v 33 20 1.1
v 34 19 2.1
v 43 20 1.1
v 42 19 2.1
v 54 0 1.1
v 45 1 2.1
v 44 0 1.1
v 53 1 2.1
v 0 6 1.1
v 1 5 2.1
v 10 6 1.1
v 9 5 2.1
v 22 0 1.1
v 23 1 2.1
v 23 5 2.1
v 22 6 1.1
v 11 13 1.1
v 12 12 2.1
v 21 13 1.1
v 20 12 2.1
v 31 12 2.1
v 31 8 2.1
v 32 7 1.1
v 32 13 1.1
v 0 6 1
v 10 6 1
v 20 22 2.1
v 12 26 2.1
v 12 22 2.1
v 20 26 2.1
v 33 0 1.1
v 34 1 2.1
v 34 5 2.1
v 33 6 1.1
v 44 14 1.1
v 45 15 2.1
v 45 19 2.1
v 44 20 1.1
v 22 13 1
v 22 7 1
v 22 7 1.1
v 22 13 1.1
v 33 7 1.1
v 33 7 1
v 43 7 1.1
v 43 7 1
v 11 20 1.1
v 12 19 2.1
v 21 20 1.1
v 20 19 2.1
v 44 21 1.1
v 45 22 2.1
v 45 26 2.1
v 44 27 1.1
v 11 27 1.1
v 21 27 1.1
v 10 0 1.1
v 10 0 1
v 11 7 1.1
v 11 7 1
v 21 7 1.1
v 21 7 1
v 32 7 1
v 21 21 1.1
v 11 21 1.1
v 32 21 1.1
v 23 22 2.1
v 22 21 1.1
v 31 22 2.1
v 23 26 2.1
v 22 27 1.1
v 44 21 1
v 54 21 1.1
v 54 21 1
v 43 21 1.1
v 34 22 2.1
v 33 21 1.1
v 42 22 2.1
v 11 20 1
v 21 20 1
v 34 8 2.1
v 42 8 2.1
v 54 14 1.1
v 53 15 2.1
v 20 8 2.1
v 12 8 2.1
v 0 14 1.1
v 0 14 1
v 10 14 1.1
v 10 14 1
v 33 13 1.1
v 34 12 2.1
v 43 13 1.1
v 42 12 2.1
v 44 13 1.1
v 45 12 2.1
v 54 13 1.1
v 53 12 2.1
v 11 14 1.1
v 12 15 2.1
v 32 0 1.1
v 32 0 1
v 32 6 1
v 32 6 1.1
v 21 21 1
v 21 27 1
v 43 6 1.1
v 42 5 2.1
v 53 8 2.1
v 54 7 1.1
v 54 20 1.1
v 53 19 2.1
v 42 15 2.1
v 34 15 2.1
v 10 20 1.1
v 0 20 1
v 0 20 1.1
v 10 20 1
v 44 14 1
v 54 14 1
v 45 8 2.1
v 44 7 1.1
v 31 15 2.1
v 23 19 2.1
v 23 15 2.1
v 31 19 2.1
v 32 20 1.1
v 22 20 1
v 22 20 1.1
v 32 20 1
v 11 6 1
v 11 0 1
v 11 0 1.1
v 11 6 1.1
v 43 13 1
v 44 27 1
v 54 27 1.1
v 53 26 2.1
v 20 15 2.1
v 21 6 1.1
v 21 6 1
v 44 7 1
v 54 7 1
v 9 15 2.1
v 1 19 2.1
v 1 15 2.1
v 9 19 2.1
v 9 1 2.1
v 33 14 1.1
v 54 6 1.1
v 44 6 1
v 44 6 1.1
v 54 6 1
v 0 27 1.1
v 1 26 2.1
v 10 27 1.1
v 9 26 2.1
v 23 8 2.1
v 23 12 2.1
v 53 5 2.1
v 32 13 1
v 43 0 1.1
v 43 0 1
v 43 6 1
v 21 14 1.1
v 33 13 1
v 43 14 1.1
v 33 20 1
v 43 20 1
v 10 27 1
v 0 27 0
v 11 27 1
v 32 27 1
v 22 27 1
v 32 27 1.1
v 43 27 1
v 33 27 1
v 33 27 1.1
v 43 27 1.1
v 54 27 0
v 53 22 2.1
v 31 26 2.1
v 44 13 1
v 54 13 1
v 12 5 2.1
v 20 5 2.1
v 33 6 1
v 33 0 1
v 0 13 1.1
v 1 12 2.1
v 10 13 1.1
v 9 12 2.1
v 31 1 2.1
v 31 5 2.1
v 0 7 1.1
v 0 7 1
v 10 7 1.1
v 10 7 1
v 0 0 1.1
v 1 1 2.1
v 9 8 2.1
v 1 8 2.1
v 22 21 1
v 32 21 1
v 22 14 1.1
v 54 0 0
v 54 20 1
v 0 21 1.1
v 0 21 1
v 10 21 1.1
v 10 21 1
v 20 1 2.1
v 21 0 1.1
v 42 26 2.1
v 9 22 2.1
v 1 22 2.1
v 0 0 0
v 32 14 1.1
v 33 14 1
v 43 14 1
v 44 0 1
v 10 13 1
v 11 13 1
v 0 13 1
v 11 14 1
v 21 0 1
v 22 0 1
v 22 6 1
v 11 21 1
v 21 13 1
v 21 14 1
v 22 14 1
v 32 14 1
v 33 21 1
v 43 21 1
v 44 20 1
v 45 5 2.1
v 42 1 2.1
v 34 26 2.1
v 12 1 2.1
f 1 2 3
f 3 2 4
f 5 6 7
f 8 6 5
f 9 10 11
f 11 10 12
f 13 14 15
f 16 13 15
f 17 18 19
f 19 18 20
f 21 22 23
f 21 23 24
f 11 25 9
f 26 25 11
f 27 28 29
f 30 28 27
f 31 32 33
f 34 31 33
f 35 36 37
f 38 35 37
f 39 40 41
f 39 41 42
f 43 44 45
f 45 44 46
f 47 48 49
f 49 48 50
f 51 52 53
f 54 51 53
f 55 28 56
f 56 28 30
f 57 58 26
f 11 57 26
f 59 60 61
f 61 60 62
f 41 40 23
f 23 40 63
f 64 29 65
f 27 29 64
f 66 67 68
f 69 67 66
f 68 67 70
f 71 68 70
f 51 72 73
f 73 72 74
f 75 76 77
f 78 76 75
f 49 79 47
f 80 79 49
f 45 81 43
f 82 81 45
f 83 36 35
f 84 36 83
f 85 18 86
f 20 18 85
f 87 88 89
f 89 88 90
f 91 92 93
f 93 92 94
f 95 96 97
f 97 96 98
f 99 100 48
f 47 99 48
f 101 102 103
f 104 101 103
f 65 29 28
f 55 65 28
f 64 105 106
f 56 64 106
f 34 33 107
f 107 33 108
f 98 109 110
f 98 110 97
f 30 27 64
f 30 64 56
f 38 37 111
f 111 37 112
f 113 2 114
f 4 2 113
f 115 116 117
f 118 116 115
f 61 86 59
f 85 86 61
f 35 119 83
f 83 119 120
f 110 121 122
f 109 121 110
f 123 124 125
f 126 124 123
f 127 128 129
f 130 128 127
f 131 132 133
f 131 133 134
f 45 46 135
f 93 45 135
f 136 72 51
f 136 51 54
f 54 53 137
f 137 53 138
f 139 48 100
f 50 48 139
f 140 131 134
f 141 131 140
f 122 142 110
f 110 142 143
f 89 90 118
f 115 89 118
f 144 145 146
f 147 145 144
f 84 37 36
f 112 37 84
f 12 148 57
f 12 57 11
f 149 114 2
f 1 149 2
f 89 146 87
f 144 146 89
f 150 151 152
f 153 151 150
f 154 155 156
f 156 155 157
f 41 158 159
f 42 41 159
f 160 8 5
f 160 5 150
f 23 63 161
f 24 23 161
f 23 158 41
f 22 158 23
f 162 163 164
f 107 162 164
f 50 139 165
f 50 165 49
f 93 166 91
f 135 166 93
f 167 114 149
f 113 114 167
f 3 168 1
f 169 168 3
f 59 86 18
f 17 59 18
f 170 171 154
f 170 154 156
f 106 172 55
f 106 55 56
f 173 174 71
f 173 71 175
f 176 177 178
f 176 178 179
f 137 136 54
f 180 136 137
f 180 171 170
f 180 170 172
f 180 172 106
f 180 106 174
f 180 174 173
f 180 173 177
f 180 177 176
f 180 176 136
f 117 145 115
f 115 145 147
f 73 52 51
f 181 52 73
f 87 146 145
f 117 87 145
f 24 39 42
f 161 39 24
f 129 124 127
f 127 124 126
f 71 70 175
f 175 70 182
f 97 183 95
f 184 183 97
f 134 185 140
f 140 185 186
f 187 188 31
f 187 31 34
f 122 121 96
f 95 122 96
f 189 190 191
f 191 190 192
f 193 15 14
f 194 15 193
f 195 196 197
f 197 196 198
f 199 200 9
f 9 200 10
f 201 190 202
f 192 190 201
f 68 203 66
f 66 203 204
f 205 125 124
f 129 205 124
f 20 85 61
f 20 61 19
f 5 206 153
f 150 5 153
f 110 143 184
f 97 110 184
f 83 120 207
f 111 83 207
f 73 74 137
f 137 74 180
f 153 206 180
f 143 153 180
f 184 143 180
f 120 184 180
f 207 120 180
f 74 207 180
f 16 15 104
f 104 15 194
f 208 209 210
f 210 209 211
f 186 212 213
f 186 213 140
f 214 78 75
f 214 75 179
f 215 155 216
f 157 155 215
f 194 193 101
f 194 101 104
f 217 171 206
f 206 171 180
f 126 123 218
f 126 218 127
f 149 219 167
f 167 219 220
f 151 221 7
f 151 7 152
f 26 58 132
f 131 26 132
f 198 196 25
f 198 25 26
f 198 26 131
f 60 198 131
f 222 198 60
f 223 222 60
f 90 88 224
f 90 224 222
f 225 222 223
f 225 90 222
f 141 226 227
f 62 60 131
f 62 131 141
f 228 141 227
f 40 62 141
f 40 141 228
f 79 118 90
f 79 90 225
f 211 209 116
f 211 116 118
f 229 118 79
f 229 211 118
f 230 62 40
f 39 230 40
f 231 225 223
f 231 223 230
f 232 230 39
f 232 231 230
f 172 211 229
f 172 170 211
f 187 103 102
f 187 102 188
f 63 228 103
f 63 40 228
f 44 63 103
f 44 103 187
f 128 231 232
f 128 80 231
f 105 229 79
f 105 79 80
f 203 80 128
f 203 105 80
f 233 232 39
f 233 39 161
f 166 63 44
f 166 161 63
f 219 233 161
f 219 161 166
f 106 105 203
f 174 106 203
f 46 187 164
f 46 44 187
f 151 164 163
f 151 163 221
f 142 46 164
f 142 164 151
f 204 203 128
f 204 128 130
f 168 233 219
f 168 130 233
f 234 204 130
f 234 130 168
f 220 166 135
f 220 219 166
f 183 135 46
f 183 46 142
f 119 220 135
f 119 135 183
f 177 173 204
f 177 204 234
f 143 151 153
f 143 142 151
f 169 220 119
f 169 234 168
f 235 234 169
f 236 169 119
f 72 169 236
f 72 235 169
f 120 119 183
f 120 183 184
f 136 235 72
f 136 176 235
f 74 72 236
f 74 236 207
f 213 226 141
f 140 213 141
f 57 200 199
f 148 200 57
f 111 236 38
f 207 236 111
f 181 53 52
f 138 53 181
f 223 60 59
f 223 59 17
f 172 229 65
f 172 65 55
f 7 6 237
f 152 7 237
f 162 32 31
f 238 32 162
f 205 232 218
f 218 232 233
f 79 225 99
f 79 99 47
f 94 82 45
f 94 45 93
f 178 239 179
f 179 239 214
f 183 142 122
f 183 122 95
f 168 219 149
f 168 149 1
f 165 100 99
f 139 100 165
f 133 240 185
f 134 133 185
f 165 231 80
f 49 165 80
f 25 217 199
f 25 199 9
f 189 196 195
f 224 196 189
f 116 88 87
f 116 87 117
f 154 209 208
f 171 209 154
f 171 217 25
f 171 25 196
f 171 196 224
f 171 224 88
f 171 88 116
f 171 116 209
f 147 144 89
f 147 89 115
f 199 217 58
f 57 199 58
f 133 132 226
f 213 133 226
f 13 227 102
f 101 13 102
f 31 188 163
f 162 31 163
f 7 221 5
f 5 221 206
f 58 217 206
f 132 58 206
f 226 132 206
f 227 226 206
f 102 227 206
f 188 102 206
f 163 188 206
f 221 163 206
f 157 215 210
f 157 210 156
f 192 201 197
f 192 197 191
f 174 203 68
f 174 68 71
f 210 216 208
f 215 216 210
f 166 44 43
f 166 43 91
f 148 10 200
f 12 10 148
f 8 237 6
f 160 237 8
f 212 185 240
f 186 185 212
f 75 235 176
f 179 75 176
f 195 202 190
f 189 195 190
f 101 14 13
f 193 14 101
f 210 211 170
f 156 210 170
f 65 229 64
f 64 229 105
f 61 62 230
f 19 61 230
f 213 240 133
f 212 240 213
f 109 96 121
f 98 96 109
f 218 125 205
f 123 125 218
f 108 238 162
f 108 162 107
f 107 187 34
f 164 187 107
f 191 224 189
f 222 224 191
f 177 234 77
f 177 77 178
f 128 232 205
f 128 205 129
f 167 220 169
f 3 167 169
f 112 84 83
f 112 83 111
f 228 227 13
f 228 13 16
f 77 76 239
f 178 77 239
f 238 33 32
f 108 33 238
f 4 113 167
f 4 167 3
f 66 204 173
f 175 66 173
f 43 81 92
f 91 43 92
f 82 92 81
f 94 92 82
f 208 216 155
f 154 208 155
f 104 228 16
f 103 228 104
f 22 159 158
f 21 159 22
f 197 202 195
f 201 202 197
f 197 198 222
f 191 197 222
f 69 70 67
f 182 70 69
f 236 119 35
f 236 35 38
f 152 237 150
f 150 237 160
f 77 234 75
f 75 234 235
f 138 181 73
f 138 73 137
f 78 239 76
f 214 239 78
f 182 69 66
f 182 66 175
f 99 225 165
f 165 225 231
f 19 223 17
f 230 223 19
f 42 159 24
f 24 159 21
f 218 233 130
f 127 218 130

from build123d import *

# Parameters (mm, degrees)
BOX001_W      = 10
BOX001_H      = 6
BOX001_DEPTH  = 1.1
CHAMFER_SIZE  = 1
ARRAY_X_COUNT = 5
ARRAY_X_PITCH = 11
ARRAY_Y_COUNT = 4
ARRAY_Y_PITCH = 7
BOX_W         = 54
BOX_H         = 27
BOX_DEPTH     = 1


with BuildPart() as array_onzas:
    # Box001 → Box001 (new body)
    with BuildSketch(Plane.XY.offset(1)):
        with Locations((5, 3)):
            Rectangle(BOX001_W, BOX001_H)
    extrude(amount=BOX001_DEPTH)

    # Chamfer
    chamfer_edges = [array_onzas.edges().sort_by_distance(p)[0] for p in [
        (0, 3, 2.1),
        (10, 3, 2.1),
        (5, 0, 2.1),
        (5, 6, 2.1),
    ]]
    chamfer(chamfer_edges, length=CHAMFER_SIZE)

    # Array X: array_onzas ×5


with BuildPart() as array_onzas_1:
    add(array_onzas.part)
    with Locations(*[(i * ARRAY_X_PITCH, 0, 0) for i in range(1, ARRAY_X_COUNT)]):
        add(array_onzas.part)

    # Array Y: array_onzas ×4


with BuildPart() as array_onzas_2:
    add(array_onzas_1.part)
    with Locations(*[(0, i * ARRAY_Y_PITCH, 0) for i in range(1, ARRAY_Y_COUNT)]):
        add(array_onzas_1.part)


with BuildPart() as tableta:
    # Box → Box (new body)
    with BuildSketch(Plane.XY):
        with Locations((27, 13.5)):
            Rectangle(BOX_W, BOX_H)
    extrude(amount=BOX_DEPTH)

    # Fusion: union array_onzas
    add(array_onzas_2.part)


solid = tableta.part
